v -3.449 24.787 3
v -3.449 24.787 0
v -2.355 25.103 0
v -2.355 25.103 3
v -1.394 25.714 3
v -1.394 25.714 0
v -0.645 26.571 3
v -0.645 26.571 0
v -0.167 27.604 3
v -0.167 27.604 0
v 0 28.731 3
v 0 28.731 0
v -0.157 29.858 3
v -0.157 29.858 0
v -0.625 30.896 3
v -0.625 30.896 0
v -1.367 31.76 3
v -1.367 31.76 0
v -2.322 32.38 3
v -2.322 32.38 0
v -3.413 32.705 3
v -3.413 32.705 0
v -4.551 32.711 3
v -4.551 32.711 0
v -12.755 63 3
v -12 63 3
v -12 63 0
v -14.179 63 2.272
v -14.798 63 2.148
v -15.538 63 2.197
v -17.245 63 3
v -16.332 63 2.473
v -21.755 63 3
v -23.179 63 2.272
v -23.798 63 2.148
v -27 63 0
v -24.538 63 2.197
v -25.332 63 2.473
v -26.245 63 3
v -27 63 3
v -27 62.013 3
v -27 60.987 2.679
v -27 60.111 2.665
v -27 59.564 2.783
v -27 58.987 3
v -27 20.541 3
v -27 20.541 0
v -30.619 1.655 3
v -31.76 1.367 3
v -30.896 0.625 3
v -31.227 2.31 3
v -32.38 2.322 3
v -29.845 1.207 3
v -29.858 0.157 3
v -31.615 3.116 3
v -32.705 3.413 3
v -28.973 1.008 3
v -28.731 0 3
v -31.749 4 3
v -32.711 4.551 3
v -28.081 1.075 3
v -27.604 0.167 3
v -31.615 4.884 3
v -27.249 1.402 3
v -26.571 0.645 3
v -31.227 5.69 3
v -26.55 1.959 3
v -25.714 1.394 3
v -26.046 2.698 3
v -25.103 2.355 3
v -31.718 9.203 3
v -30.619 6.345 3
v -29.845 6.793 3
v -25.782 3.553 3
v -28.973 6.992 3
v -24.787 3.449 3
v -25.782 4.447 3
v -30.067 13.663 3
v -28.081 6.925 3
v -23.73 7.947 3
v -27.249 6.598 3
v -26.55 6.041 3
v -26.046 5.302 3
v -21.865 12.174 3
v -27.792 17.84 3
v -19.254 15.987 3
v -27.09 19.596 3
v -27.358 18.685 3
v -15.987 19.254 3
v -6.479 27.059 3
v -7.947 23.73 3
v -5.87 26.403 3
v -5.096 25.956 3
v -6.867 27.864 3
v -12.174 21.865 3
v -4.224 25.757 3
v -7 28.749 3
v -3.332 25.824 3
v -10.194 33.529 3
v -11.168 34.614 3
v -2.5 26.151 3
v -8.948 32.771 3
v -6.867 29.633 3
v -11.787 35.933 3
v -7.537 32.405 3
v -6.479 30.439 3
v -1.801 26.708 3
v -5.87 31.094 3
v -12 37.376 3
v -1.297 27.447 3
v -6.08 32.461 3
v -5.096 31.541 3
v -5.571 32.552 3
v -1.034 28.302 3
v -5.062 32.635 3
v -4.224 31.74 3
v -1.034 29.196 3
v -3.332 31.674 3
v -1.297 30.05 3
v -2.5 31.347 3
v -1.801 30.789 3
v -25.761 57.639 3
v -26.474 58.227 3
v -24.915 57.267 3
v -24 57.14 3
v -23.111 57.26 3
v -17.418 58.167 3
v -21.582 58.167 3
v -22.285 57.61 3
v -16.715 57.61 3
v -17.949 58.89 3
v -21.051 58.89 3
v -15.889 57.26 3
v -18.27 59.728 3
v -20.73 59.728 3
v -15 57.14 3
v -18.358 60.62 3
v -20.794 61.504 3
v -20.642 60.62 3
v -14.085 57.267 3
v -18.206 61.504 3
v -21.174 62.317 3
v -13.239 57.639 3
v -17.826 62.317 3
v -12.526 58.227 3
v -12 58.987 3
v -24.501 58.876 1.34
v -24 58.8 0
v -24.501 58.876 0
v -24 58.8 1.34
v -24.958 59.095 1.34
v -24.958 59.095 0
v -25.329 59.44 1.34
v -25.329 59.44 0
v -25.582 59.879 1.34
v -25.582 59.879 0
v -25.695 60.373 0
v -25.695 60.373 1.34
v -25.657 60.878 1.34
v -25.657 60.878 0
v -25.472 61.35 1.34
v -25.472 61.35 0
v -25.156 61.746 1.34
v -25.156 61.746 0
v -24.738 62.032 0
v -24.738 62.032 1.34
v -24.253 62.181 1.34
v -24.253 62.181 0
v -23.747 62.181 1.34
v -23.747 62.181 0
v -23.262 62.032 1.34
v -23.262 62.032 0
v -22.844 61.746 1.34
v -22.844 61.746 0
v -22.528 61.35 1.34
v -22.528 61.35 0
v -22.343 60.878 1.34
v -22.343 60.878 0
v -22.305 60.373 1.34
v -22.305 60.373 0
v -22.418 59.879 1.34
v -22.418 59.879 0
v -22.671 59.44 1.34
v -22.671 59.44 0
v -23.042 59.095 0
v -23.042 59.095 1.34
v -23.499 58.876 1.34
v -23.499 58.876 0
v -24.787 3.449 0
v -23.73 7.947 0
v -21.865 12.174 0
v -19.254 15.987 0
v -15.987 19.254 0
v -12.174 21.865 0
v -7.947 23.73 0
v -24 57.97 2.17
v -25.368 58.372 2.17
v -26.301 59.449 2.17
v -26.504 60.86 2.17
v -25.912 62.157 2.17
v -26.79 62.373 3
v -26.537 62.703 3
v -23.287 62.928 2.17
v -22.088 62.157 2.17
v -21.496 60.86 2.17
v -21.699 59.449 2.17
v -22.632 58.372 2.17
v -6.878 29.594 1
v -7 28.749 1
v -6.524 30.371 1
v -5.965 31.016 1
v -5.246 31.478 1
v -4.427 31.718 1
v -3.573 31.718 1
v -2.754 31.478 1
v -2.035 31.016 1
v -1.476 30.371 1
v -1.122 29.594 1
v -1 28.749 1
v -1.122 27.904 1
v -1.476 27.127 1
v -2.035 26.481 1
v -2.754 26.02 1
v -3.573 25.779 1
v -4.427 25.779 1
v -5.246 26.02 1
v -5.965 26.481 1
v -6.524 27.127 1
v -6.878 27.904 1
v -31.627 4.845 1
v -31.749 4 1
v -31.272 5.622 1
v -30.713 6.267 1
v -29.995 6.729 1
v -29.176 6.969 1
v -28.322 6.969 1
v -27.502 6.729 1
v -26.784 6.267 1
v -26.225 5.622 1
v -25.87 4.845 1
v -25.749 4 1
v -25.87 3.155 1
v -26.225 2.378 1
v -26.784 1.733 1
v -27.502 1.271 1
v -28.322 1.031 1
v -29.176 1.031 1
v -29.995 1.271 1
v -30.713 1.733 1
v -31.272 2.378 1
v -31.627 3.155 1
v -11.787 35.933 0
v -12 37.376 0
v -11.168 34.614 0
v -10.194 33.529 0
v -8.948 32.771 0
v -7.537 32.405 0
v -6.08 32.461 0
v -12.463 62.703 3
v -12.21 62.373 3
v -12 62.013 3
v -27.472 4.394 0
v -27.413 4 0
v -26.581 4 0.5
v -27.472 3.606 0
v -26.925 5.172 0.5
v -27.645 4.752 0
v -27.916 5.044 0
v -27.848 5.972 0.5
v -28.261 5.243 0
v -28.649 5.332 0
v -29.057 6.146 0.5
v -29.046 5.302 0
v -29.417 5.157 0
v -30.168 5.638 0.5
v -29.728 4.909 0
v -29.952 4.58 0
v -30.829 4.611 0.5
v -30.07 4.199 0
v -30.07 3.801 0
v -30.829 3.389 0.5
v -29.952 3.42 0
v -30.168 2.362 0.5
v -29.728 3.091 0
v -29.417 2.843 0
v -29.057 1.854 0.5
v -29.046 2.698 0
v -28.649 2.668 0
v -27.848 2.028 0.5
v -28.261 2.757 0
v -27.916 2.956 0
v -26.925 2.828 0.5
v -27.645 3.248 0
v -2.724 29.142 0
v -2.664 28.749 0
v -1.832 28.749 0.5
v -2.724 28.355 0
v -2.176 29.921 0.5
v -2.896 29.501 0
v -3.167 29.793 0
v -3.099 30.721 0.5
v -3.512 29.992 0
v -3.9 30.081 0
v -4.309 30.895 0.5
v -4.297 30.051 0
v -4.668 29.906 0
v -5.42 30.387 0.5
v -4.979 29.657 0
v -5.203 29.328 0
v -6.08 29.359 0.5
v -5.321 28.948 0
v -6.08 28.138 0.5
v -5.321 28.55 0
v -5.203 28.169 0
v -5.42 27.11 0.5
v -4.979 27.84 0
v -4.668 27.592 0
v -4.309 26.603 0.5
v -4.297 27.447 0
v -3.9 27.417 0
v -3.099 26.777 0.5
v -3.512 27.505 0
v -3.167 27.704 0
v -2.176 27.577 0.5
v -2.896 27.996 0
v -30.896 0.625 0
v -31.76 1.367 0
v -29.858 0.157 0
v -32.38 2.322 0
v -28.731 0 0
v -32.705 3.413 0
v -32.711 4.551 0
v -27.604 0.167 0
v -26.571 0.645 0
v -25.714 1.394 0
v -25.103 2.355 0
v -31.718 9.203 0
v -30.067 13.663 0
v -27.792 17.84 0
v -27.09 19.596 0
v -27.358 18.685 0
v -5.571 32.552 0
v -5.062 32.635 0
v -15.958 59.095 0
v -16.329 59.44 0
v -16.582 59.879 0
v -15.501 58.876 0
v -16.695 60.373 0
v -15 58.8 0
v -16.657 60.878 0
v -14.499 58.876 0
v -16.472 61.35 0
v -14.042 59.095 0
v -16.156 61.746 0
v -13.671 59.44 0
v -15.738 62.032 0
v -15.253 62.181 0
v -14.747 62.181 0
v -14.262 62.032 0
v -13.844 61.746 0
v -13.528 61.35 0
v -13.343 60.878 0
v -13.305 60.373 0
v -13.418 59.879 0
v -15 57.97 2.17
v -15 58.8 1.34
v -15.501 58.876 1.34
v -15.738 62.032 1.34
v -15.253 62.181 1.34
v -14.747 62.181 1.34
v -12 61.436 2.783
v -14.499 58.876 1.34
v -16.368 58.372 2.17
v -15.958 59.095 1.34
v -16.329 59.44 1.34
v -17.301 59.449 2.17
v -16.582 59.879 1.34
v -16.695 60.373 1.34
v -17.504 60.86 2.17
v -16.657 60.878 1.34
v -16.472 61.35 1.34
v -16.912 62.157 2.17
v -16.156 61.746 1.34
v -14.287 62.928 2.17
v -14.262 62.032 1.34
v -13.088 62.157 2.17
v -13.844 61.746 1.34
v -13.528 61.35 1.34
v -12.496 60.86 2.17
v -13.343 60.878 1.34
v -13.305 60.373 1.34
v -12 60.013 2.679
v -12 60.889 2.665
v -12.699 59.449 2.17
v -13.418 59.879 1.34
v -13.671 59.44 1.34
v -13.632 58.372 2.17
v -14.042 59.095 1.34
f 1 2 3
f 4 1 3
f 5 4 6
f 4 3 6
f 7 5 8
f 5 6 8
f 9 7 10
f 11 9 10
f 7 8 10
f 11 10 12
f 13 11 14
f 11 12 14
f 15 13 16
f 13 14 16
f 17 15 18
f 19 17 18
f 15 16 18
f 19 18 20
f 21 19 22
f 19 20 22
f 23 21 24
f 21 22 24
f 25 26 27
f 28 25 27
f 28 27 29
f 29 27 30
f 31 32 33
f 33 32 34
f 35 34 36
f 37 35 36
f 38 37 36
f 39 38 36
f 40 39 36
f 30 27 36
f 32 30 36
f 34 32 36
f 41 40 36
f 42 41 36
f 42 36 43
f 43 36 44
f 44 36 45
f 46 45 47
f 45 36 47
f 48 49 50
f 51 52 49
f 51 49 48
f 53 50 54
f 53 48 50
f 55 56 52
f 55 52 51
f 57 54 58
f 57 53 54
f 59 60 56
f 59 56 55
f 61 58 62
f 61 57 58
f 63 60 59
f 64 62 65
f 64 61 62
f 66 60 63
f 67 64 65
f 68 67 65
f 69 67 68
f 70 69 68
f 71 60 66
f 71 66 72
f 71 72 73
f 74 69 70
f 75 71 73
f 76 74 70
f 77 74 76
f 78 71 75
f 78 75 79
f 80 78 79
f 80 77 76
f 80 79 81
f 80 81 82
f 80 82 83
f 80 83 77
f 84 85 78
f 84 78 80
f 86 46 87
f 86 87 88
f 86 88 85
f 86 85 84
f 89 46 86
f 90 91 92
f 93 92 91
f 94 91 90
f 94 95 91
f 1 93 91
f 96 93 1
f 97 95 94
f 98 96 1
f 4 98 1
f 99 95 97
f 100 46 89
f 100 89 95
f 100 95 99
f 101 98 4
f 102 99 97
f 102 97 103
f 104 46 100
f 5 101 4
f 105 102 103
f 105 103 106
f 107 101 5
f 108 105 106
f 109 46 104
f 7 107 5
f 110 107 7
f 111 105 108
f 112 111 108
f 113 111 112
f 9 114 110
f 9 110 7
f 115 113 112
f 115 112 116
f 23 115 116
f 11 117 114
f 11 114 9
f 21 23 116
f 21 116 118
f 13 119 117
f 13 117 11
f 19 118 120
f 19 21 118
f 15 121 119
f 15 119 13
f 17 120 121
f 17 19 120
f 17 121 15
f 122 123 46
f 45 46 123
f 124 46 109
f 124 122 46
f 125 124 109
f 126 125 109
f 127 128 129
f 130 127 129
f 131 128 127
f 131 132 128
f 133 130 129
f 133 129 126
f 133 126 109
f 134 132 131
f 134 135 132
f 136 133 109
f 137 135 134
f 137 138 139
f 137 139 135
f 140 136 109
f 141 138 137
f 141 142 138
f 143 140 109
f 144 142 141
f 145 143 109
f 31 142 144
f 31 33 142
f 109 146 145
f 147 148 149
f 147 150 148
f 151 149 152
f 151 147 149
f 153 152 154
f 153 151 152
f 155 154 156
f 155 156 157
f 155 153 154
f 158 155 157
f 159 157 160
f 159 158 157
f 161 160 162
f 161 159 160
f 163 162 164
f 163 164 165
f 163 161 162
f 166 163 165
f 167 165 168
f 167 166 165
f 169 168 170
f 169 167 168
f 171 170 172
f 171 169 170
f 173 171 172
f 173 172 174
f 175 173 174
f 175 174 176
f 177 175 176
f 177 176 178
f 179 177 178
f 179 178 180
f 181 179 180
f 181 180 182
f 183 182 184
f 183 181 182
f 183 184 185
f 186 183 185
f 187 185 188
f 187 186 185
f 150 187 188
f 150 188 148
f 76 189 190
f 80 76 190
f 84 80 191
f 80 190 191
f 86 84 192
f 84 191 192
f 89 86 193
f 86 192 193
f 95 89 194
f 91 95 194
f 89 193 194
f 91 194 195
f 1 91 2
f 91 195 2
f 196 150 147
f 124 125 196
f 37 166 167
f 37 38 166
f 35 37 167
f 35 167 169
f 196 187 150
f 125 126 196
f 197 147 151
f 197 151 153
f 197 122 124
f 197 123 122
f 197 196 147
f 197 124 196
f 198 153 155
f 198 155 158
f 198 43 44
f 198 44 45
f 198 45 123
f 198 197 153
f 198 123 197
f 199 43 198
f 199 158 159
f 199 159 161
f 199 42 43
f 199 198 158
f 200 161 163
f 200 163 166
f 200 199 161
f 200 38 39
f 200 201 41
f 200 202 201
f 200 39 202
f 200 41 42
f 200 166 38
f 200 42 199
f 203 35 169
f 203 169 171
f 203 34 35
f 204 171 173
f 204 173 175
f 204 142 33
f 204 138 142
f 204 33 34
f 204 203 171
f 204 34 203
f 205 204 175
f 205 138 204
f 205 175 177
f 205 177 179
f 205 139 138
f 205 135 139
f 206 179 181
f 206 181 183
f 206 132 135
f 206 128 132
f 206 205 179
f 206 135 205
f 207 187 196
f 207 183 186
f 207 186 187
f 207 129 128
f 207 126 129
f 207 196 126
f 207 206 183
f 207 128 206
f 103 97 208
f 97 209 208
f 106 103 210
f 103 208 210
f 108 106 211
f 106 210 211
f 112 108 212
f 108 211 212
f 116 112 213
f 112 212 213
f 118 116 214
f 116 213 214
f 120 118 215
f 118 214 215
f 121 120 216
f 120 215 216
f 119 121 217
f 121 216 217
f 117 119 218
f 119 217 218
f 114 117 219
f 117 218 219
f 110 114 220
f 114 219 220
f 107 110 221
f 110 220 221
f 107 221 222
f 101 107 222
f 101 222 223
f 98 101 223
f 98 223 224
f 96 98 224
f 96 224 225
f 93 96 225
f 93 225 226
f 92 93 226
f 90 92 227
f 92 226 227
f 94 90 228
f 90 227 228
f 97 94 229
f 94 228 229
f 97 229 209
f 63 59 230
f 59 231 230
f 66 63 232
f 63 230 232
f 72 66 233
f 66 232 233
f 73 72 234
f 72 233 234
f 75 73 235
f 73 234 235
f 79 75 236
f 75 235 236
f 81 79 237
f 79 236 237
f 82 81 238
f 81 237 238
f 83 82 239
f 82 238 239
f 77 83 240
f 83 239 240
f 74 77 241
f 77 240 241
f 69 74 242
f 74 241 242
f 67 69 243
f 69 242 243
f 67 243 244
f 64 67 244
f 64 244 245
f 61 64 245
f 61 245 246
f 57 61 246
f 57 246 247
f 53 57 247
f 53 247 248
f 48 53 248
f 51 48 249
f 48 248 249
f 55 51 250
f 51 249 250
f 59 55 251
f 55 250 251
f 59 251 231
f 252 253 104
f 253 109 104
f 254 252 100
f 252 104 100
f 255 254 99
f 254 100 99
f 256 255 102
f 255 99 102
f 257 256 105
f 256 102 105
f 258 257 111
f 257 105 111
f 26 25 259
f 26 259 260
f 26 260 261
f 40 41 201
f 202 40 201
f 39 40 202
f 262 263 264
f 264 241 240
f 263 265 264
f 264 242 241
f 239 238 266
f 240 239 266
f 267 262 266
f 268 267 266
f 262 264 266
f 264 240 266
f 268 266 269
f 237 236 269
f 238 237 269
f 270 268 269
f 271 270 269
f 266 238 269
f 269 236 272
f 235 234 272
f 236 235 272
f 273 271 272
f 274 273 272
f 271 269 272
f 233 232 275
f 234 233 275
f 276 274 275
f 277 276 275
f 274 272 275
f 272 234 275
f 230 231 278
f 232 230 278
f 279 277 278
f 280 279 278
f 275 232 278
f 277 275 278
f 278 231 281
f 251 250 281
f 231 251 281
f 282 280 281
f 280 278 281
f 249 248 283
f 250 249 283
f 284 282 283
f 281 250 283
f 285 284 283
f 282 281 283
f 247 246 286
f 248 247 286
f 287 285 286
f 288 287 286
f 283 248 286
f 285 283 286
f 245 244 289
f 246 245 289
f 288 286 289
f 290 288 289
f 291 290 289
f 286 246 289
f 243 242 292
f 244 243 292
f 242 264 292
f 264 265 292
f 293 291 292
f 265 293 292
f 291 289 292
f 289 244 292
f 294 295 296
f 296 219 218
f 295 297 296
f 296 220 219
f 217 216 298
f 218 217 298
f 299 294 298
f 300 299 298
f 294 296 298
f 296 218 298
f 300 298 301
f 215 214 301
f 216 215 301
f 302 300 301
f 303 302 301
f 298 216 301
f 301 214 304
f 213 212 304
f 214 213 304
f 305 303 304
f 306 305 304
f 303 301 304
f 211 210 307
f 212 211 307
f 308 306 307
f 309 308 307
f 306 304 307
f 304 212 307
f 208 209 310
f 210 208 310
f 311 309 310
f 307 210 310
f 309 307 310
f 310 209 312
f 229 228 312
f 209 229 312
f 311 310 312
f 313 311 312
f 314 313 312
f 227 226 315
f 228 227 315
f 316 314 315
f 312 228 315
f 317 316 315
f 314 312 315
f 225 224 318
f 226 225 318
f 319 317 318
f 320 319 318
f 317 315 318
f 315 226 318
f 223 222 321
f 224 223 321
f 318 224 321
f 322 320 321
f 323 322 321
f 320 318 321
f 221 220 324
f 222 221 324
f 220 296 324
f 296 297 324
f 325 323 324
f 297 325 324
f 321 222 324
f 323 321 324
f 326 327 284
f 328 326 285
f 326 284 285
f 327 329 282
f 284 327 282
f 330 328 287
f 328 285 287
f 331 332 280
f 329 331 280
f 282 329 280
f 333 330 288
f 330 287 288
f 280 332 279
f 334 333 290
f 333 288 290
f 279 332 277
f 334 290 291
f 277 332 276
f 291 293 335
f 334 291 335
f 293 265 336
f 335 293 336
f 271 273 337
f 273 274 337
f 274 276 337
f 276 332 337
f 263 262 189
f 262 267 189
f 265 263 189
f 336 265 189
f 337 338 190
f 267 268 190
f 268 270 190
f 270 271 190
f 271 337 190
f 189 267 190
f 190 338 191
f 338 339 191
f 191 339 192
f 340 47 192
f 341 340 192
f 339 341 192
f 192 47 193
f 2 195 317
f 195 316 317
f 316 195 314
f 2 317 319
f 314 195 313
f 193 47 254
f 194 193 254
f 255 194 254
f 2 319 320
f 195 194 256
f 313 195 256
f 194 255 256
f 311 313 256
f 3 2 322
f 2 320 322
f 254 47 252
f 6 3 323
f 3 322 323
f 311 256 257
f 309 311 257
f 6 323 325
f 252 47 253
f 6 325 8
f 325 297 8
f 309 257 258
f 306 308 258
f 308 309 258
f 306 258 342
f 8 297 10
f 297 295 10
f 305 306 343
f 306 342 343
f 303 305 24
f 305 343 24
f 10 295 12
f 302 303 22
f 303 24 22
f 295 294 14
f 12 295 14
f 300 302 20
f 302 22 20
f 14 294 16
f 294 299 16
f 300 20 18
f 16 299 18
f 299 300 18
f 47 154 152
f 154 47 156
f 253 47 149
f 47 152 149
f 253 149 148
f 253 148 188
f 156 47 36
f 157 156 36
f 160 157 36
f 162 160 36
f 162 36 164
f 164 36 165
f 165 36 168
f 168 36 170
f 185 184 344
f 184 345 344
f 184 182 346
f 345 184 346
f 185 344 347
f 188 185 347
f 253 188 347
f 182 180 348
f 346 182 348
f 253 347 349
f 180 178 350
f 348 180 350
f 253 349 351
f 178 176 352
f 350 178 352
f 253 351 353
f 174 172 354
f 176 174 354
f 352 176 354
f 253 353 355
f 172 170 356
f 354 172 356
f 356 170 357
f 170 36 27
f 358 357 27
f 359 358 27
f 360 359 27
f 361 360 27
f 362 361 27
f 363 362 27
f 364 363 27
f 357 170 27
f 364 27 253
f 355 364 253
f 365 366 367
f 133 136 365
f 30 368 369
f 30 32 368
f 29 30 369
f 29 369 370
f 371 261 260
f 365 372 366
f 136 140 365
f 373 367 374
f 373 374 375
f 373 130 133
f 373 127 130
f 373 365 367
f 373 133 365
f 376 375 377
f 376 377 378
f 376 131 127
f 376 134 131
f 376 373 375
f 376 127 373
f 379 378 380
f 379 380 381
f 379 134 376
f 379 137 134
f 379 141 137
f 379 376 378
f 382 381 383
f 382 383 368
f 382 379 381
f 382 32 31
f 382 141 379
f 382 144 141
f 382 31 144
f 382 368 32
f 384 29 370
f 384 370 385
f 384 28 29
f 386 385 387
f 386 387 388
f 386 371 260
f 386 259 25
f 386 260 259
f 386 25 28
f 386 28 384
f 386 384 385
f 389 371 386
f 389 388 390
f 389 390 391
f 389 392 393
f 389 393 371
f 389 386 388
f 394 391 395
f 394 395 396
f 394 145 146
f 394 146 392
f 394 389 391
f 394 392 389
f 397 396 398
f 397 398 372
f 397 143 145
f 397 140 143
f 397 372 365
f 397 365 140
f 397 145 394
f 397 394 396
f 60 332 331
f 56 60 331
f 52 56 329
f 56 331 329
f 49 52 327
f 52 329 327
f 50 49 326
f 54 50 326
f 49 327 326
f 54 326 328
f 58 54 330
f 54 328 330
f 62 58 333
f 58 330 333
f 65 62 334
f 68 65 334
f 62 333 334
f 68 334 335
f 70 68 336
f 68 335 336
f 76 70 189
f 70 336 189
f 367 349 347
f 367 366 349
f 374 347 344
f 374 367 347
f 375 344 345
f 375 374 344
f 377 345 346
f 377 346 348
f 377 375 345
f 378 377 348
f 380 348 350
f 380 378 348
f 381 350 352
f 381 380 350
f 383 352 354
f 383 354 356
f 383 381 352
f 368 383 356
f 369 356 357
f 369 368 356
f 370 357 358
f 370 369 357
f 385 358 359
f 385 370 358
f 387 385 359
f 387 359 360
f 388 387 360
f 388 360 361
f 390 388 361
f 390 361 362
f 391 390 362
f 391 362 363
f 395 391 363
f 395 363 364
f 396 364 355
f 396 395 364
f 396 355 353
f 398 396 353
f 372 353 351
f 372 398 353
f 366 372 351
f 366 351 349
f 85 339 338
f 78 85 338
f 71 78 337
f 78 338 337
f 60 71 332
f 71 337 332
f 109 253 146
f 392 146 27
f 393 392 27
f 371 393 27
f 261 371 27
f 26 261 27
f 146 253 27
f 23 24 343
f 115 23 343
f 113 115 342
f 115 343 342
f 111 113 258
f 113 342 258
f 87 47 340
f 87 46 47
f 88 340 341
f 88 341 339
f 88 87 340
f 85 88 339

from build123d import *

# Parameters (mm, degrees)
RESSALTO_EXTRUS_O2_DEPTH                  = 3
BROCA_DE_ROSQUEAR_PARA_TARRAXA_DE_M2_51_D = 2.05
FURO_DE_DI_METRO_6_0_6_2_D                = 6
FURO_DE_DI_METRO_6_0_6_2_DEPTH            = 2
FURO_DE_DI_METRO_6_0_6_2_TIP              = 1.802581857
ESCAREADO_PARA_SFHCS_M31_AT_2_COUNT       = 2
ESCAREADO_PARA_SFHCS_M31_AT_2_PITCH       = 9
FILETE1_R                                 = 5


with BuildPart() as part:
    # Esboço1 → Ressalto-extrusão2 (new body)
    with BuildSketch(Plane.XY):
        with BuildLine():
            Line((-12, 30.768414179), (-12, 63))
            Line((-12, 63), (-27, 63))
            Line((-27, 63), (-27, 19.018288858))
            ThreePointArc((-27, 19.018288858), (-30.719082421, 12.125728279), (-32.710572622, 4.551236075))
            ThreePointArc((-32.710572622, 4.551236075), (-29.299973416, 0.038164719), (-24.786902061, 3.448763925))
            ThreePointArc((-24.786902061, 3.448763925), (-17.695825587, 17.695825587), (-3.448763925, 24.786902061))
            ThreePointArc((-3.448763925, 24.786902061), (-0.038164719, 29.299973416), (-4.551236075, 32.710572622))
            ThreePointArc((-4.551236075, 32.710572622), (-8.332397539, 31.957259931), (-12, 30.768414179))
        make_face()
    extrude(amount=RESSALTO_EXTRUS_O2_DEPTH)

    # Broca de rosquear para tarraxa de M2.51 (through all)
    with Locations(Plane.XY.offset(3)):
        with Locations((-28.748737342, 4), (-4, 28.748737342)):
            Hole(BROCA_DE_ROSQUEAR_PARA_TARRAXA_DE_M2_51_D / 2)

    # Furo de diâmetro Ø6.0 (6)2
    with Locations(Plane.XY.offset(3)):
        with Locations((-28.748737342, 4), (-4, 28.748737342)):
            Hole(FURO_DE_DI_METRO_6_0_6_2_D / 2, depth=FURO_DE_DI_METRO_6_0_6_2_DEPTH)
            with Locations((0, 0, -(FURO_DE_DI_METRO_6_0_6_2_DEPTH + FURO_DE_DI_METRO_6_0_6_2_TIP / 2))):  # 118° drill point
                Cone(0, FURO_DE_DI_METRO_6_0_6_2_D / 2, FURO_DE_DI_METRO_6_0_6_2_TIP, mode=Mode.SUBTRACT)

    # Esboço13 → Escareado para SFHCS M31 (revolve, cut)
    with BuildSketch(Plane(origin=(-24, 60.5, 3), x_dir=(0, -1, 0), z_dir=(1, 0, 0))):
        Polygon((0, 0), (0, 3), (1.7, 3), (1.7, 1.66), (3.36, 0), align=None)
    escareado_para_sfhcs_m31 = revolve(axis=Axis((-24, 60.5, 9.35), (0, 0, -1)), mode=Mode.SUBTRACT)

    # Escareado para SFHCS M31 at 2: Escareado para SFHCS M31 ×2
    with Locations(*[(i * ESCAREADO_PARA_SFHCS_M31_AT_2_PITCH, 0, 0) for i in range(1, ESCAREADO_PARA_SFHCS_M31_AT_2_COUNT)]):
        add(escareado_para_sfhcs_m31, mode=Mode.SUBTRACT)

    # Filete1
    filete1_edges = [part.edges().sort_by_distance(p)[0] for p in [
        (-27, 19.018288858, 1.5),
        (-12, 30.768414179, 1.5),
    ]]
    fillet(filete1_edges, radius=FILETE1_R)


solid = part.part
